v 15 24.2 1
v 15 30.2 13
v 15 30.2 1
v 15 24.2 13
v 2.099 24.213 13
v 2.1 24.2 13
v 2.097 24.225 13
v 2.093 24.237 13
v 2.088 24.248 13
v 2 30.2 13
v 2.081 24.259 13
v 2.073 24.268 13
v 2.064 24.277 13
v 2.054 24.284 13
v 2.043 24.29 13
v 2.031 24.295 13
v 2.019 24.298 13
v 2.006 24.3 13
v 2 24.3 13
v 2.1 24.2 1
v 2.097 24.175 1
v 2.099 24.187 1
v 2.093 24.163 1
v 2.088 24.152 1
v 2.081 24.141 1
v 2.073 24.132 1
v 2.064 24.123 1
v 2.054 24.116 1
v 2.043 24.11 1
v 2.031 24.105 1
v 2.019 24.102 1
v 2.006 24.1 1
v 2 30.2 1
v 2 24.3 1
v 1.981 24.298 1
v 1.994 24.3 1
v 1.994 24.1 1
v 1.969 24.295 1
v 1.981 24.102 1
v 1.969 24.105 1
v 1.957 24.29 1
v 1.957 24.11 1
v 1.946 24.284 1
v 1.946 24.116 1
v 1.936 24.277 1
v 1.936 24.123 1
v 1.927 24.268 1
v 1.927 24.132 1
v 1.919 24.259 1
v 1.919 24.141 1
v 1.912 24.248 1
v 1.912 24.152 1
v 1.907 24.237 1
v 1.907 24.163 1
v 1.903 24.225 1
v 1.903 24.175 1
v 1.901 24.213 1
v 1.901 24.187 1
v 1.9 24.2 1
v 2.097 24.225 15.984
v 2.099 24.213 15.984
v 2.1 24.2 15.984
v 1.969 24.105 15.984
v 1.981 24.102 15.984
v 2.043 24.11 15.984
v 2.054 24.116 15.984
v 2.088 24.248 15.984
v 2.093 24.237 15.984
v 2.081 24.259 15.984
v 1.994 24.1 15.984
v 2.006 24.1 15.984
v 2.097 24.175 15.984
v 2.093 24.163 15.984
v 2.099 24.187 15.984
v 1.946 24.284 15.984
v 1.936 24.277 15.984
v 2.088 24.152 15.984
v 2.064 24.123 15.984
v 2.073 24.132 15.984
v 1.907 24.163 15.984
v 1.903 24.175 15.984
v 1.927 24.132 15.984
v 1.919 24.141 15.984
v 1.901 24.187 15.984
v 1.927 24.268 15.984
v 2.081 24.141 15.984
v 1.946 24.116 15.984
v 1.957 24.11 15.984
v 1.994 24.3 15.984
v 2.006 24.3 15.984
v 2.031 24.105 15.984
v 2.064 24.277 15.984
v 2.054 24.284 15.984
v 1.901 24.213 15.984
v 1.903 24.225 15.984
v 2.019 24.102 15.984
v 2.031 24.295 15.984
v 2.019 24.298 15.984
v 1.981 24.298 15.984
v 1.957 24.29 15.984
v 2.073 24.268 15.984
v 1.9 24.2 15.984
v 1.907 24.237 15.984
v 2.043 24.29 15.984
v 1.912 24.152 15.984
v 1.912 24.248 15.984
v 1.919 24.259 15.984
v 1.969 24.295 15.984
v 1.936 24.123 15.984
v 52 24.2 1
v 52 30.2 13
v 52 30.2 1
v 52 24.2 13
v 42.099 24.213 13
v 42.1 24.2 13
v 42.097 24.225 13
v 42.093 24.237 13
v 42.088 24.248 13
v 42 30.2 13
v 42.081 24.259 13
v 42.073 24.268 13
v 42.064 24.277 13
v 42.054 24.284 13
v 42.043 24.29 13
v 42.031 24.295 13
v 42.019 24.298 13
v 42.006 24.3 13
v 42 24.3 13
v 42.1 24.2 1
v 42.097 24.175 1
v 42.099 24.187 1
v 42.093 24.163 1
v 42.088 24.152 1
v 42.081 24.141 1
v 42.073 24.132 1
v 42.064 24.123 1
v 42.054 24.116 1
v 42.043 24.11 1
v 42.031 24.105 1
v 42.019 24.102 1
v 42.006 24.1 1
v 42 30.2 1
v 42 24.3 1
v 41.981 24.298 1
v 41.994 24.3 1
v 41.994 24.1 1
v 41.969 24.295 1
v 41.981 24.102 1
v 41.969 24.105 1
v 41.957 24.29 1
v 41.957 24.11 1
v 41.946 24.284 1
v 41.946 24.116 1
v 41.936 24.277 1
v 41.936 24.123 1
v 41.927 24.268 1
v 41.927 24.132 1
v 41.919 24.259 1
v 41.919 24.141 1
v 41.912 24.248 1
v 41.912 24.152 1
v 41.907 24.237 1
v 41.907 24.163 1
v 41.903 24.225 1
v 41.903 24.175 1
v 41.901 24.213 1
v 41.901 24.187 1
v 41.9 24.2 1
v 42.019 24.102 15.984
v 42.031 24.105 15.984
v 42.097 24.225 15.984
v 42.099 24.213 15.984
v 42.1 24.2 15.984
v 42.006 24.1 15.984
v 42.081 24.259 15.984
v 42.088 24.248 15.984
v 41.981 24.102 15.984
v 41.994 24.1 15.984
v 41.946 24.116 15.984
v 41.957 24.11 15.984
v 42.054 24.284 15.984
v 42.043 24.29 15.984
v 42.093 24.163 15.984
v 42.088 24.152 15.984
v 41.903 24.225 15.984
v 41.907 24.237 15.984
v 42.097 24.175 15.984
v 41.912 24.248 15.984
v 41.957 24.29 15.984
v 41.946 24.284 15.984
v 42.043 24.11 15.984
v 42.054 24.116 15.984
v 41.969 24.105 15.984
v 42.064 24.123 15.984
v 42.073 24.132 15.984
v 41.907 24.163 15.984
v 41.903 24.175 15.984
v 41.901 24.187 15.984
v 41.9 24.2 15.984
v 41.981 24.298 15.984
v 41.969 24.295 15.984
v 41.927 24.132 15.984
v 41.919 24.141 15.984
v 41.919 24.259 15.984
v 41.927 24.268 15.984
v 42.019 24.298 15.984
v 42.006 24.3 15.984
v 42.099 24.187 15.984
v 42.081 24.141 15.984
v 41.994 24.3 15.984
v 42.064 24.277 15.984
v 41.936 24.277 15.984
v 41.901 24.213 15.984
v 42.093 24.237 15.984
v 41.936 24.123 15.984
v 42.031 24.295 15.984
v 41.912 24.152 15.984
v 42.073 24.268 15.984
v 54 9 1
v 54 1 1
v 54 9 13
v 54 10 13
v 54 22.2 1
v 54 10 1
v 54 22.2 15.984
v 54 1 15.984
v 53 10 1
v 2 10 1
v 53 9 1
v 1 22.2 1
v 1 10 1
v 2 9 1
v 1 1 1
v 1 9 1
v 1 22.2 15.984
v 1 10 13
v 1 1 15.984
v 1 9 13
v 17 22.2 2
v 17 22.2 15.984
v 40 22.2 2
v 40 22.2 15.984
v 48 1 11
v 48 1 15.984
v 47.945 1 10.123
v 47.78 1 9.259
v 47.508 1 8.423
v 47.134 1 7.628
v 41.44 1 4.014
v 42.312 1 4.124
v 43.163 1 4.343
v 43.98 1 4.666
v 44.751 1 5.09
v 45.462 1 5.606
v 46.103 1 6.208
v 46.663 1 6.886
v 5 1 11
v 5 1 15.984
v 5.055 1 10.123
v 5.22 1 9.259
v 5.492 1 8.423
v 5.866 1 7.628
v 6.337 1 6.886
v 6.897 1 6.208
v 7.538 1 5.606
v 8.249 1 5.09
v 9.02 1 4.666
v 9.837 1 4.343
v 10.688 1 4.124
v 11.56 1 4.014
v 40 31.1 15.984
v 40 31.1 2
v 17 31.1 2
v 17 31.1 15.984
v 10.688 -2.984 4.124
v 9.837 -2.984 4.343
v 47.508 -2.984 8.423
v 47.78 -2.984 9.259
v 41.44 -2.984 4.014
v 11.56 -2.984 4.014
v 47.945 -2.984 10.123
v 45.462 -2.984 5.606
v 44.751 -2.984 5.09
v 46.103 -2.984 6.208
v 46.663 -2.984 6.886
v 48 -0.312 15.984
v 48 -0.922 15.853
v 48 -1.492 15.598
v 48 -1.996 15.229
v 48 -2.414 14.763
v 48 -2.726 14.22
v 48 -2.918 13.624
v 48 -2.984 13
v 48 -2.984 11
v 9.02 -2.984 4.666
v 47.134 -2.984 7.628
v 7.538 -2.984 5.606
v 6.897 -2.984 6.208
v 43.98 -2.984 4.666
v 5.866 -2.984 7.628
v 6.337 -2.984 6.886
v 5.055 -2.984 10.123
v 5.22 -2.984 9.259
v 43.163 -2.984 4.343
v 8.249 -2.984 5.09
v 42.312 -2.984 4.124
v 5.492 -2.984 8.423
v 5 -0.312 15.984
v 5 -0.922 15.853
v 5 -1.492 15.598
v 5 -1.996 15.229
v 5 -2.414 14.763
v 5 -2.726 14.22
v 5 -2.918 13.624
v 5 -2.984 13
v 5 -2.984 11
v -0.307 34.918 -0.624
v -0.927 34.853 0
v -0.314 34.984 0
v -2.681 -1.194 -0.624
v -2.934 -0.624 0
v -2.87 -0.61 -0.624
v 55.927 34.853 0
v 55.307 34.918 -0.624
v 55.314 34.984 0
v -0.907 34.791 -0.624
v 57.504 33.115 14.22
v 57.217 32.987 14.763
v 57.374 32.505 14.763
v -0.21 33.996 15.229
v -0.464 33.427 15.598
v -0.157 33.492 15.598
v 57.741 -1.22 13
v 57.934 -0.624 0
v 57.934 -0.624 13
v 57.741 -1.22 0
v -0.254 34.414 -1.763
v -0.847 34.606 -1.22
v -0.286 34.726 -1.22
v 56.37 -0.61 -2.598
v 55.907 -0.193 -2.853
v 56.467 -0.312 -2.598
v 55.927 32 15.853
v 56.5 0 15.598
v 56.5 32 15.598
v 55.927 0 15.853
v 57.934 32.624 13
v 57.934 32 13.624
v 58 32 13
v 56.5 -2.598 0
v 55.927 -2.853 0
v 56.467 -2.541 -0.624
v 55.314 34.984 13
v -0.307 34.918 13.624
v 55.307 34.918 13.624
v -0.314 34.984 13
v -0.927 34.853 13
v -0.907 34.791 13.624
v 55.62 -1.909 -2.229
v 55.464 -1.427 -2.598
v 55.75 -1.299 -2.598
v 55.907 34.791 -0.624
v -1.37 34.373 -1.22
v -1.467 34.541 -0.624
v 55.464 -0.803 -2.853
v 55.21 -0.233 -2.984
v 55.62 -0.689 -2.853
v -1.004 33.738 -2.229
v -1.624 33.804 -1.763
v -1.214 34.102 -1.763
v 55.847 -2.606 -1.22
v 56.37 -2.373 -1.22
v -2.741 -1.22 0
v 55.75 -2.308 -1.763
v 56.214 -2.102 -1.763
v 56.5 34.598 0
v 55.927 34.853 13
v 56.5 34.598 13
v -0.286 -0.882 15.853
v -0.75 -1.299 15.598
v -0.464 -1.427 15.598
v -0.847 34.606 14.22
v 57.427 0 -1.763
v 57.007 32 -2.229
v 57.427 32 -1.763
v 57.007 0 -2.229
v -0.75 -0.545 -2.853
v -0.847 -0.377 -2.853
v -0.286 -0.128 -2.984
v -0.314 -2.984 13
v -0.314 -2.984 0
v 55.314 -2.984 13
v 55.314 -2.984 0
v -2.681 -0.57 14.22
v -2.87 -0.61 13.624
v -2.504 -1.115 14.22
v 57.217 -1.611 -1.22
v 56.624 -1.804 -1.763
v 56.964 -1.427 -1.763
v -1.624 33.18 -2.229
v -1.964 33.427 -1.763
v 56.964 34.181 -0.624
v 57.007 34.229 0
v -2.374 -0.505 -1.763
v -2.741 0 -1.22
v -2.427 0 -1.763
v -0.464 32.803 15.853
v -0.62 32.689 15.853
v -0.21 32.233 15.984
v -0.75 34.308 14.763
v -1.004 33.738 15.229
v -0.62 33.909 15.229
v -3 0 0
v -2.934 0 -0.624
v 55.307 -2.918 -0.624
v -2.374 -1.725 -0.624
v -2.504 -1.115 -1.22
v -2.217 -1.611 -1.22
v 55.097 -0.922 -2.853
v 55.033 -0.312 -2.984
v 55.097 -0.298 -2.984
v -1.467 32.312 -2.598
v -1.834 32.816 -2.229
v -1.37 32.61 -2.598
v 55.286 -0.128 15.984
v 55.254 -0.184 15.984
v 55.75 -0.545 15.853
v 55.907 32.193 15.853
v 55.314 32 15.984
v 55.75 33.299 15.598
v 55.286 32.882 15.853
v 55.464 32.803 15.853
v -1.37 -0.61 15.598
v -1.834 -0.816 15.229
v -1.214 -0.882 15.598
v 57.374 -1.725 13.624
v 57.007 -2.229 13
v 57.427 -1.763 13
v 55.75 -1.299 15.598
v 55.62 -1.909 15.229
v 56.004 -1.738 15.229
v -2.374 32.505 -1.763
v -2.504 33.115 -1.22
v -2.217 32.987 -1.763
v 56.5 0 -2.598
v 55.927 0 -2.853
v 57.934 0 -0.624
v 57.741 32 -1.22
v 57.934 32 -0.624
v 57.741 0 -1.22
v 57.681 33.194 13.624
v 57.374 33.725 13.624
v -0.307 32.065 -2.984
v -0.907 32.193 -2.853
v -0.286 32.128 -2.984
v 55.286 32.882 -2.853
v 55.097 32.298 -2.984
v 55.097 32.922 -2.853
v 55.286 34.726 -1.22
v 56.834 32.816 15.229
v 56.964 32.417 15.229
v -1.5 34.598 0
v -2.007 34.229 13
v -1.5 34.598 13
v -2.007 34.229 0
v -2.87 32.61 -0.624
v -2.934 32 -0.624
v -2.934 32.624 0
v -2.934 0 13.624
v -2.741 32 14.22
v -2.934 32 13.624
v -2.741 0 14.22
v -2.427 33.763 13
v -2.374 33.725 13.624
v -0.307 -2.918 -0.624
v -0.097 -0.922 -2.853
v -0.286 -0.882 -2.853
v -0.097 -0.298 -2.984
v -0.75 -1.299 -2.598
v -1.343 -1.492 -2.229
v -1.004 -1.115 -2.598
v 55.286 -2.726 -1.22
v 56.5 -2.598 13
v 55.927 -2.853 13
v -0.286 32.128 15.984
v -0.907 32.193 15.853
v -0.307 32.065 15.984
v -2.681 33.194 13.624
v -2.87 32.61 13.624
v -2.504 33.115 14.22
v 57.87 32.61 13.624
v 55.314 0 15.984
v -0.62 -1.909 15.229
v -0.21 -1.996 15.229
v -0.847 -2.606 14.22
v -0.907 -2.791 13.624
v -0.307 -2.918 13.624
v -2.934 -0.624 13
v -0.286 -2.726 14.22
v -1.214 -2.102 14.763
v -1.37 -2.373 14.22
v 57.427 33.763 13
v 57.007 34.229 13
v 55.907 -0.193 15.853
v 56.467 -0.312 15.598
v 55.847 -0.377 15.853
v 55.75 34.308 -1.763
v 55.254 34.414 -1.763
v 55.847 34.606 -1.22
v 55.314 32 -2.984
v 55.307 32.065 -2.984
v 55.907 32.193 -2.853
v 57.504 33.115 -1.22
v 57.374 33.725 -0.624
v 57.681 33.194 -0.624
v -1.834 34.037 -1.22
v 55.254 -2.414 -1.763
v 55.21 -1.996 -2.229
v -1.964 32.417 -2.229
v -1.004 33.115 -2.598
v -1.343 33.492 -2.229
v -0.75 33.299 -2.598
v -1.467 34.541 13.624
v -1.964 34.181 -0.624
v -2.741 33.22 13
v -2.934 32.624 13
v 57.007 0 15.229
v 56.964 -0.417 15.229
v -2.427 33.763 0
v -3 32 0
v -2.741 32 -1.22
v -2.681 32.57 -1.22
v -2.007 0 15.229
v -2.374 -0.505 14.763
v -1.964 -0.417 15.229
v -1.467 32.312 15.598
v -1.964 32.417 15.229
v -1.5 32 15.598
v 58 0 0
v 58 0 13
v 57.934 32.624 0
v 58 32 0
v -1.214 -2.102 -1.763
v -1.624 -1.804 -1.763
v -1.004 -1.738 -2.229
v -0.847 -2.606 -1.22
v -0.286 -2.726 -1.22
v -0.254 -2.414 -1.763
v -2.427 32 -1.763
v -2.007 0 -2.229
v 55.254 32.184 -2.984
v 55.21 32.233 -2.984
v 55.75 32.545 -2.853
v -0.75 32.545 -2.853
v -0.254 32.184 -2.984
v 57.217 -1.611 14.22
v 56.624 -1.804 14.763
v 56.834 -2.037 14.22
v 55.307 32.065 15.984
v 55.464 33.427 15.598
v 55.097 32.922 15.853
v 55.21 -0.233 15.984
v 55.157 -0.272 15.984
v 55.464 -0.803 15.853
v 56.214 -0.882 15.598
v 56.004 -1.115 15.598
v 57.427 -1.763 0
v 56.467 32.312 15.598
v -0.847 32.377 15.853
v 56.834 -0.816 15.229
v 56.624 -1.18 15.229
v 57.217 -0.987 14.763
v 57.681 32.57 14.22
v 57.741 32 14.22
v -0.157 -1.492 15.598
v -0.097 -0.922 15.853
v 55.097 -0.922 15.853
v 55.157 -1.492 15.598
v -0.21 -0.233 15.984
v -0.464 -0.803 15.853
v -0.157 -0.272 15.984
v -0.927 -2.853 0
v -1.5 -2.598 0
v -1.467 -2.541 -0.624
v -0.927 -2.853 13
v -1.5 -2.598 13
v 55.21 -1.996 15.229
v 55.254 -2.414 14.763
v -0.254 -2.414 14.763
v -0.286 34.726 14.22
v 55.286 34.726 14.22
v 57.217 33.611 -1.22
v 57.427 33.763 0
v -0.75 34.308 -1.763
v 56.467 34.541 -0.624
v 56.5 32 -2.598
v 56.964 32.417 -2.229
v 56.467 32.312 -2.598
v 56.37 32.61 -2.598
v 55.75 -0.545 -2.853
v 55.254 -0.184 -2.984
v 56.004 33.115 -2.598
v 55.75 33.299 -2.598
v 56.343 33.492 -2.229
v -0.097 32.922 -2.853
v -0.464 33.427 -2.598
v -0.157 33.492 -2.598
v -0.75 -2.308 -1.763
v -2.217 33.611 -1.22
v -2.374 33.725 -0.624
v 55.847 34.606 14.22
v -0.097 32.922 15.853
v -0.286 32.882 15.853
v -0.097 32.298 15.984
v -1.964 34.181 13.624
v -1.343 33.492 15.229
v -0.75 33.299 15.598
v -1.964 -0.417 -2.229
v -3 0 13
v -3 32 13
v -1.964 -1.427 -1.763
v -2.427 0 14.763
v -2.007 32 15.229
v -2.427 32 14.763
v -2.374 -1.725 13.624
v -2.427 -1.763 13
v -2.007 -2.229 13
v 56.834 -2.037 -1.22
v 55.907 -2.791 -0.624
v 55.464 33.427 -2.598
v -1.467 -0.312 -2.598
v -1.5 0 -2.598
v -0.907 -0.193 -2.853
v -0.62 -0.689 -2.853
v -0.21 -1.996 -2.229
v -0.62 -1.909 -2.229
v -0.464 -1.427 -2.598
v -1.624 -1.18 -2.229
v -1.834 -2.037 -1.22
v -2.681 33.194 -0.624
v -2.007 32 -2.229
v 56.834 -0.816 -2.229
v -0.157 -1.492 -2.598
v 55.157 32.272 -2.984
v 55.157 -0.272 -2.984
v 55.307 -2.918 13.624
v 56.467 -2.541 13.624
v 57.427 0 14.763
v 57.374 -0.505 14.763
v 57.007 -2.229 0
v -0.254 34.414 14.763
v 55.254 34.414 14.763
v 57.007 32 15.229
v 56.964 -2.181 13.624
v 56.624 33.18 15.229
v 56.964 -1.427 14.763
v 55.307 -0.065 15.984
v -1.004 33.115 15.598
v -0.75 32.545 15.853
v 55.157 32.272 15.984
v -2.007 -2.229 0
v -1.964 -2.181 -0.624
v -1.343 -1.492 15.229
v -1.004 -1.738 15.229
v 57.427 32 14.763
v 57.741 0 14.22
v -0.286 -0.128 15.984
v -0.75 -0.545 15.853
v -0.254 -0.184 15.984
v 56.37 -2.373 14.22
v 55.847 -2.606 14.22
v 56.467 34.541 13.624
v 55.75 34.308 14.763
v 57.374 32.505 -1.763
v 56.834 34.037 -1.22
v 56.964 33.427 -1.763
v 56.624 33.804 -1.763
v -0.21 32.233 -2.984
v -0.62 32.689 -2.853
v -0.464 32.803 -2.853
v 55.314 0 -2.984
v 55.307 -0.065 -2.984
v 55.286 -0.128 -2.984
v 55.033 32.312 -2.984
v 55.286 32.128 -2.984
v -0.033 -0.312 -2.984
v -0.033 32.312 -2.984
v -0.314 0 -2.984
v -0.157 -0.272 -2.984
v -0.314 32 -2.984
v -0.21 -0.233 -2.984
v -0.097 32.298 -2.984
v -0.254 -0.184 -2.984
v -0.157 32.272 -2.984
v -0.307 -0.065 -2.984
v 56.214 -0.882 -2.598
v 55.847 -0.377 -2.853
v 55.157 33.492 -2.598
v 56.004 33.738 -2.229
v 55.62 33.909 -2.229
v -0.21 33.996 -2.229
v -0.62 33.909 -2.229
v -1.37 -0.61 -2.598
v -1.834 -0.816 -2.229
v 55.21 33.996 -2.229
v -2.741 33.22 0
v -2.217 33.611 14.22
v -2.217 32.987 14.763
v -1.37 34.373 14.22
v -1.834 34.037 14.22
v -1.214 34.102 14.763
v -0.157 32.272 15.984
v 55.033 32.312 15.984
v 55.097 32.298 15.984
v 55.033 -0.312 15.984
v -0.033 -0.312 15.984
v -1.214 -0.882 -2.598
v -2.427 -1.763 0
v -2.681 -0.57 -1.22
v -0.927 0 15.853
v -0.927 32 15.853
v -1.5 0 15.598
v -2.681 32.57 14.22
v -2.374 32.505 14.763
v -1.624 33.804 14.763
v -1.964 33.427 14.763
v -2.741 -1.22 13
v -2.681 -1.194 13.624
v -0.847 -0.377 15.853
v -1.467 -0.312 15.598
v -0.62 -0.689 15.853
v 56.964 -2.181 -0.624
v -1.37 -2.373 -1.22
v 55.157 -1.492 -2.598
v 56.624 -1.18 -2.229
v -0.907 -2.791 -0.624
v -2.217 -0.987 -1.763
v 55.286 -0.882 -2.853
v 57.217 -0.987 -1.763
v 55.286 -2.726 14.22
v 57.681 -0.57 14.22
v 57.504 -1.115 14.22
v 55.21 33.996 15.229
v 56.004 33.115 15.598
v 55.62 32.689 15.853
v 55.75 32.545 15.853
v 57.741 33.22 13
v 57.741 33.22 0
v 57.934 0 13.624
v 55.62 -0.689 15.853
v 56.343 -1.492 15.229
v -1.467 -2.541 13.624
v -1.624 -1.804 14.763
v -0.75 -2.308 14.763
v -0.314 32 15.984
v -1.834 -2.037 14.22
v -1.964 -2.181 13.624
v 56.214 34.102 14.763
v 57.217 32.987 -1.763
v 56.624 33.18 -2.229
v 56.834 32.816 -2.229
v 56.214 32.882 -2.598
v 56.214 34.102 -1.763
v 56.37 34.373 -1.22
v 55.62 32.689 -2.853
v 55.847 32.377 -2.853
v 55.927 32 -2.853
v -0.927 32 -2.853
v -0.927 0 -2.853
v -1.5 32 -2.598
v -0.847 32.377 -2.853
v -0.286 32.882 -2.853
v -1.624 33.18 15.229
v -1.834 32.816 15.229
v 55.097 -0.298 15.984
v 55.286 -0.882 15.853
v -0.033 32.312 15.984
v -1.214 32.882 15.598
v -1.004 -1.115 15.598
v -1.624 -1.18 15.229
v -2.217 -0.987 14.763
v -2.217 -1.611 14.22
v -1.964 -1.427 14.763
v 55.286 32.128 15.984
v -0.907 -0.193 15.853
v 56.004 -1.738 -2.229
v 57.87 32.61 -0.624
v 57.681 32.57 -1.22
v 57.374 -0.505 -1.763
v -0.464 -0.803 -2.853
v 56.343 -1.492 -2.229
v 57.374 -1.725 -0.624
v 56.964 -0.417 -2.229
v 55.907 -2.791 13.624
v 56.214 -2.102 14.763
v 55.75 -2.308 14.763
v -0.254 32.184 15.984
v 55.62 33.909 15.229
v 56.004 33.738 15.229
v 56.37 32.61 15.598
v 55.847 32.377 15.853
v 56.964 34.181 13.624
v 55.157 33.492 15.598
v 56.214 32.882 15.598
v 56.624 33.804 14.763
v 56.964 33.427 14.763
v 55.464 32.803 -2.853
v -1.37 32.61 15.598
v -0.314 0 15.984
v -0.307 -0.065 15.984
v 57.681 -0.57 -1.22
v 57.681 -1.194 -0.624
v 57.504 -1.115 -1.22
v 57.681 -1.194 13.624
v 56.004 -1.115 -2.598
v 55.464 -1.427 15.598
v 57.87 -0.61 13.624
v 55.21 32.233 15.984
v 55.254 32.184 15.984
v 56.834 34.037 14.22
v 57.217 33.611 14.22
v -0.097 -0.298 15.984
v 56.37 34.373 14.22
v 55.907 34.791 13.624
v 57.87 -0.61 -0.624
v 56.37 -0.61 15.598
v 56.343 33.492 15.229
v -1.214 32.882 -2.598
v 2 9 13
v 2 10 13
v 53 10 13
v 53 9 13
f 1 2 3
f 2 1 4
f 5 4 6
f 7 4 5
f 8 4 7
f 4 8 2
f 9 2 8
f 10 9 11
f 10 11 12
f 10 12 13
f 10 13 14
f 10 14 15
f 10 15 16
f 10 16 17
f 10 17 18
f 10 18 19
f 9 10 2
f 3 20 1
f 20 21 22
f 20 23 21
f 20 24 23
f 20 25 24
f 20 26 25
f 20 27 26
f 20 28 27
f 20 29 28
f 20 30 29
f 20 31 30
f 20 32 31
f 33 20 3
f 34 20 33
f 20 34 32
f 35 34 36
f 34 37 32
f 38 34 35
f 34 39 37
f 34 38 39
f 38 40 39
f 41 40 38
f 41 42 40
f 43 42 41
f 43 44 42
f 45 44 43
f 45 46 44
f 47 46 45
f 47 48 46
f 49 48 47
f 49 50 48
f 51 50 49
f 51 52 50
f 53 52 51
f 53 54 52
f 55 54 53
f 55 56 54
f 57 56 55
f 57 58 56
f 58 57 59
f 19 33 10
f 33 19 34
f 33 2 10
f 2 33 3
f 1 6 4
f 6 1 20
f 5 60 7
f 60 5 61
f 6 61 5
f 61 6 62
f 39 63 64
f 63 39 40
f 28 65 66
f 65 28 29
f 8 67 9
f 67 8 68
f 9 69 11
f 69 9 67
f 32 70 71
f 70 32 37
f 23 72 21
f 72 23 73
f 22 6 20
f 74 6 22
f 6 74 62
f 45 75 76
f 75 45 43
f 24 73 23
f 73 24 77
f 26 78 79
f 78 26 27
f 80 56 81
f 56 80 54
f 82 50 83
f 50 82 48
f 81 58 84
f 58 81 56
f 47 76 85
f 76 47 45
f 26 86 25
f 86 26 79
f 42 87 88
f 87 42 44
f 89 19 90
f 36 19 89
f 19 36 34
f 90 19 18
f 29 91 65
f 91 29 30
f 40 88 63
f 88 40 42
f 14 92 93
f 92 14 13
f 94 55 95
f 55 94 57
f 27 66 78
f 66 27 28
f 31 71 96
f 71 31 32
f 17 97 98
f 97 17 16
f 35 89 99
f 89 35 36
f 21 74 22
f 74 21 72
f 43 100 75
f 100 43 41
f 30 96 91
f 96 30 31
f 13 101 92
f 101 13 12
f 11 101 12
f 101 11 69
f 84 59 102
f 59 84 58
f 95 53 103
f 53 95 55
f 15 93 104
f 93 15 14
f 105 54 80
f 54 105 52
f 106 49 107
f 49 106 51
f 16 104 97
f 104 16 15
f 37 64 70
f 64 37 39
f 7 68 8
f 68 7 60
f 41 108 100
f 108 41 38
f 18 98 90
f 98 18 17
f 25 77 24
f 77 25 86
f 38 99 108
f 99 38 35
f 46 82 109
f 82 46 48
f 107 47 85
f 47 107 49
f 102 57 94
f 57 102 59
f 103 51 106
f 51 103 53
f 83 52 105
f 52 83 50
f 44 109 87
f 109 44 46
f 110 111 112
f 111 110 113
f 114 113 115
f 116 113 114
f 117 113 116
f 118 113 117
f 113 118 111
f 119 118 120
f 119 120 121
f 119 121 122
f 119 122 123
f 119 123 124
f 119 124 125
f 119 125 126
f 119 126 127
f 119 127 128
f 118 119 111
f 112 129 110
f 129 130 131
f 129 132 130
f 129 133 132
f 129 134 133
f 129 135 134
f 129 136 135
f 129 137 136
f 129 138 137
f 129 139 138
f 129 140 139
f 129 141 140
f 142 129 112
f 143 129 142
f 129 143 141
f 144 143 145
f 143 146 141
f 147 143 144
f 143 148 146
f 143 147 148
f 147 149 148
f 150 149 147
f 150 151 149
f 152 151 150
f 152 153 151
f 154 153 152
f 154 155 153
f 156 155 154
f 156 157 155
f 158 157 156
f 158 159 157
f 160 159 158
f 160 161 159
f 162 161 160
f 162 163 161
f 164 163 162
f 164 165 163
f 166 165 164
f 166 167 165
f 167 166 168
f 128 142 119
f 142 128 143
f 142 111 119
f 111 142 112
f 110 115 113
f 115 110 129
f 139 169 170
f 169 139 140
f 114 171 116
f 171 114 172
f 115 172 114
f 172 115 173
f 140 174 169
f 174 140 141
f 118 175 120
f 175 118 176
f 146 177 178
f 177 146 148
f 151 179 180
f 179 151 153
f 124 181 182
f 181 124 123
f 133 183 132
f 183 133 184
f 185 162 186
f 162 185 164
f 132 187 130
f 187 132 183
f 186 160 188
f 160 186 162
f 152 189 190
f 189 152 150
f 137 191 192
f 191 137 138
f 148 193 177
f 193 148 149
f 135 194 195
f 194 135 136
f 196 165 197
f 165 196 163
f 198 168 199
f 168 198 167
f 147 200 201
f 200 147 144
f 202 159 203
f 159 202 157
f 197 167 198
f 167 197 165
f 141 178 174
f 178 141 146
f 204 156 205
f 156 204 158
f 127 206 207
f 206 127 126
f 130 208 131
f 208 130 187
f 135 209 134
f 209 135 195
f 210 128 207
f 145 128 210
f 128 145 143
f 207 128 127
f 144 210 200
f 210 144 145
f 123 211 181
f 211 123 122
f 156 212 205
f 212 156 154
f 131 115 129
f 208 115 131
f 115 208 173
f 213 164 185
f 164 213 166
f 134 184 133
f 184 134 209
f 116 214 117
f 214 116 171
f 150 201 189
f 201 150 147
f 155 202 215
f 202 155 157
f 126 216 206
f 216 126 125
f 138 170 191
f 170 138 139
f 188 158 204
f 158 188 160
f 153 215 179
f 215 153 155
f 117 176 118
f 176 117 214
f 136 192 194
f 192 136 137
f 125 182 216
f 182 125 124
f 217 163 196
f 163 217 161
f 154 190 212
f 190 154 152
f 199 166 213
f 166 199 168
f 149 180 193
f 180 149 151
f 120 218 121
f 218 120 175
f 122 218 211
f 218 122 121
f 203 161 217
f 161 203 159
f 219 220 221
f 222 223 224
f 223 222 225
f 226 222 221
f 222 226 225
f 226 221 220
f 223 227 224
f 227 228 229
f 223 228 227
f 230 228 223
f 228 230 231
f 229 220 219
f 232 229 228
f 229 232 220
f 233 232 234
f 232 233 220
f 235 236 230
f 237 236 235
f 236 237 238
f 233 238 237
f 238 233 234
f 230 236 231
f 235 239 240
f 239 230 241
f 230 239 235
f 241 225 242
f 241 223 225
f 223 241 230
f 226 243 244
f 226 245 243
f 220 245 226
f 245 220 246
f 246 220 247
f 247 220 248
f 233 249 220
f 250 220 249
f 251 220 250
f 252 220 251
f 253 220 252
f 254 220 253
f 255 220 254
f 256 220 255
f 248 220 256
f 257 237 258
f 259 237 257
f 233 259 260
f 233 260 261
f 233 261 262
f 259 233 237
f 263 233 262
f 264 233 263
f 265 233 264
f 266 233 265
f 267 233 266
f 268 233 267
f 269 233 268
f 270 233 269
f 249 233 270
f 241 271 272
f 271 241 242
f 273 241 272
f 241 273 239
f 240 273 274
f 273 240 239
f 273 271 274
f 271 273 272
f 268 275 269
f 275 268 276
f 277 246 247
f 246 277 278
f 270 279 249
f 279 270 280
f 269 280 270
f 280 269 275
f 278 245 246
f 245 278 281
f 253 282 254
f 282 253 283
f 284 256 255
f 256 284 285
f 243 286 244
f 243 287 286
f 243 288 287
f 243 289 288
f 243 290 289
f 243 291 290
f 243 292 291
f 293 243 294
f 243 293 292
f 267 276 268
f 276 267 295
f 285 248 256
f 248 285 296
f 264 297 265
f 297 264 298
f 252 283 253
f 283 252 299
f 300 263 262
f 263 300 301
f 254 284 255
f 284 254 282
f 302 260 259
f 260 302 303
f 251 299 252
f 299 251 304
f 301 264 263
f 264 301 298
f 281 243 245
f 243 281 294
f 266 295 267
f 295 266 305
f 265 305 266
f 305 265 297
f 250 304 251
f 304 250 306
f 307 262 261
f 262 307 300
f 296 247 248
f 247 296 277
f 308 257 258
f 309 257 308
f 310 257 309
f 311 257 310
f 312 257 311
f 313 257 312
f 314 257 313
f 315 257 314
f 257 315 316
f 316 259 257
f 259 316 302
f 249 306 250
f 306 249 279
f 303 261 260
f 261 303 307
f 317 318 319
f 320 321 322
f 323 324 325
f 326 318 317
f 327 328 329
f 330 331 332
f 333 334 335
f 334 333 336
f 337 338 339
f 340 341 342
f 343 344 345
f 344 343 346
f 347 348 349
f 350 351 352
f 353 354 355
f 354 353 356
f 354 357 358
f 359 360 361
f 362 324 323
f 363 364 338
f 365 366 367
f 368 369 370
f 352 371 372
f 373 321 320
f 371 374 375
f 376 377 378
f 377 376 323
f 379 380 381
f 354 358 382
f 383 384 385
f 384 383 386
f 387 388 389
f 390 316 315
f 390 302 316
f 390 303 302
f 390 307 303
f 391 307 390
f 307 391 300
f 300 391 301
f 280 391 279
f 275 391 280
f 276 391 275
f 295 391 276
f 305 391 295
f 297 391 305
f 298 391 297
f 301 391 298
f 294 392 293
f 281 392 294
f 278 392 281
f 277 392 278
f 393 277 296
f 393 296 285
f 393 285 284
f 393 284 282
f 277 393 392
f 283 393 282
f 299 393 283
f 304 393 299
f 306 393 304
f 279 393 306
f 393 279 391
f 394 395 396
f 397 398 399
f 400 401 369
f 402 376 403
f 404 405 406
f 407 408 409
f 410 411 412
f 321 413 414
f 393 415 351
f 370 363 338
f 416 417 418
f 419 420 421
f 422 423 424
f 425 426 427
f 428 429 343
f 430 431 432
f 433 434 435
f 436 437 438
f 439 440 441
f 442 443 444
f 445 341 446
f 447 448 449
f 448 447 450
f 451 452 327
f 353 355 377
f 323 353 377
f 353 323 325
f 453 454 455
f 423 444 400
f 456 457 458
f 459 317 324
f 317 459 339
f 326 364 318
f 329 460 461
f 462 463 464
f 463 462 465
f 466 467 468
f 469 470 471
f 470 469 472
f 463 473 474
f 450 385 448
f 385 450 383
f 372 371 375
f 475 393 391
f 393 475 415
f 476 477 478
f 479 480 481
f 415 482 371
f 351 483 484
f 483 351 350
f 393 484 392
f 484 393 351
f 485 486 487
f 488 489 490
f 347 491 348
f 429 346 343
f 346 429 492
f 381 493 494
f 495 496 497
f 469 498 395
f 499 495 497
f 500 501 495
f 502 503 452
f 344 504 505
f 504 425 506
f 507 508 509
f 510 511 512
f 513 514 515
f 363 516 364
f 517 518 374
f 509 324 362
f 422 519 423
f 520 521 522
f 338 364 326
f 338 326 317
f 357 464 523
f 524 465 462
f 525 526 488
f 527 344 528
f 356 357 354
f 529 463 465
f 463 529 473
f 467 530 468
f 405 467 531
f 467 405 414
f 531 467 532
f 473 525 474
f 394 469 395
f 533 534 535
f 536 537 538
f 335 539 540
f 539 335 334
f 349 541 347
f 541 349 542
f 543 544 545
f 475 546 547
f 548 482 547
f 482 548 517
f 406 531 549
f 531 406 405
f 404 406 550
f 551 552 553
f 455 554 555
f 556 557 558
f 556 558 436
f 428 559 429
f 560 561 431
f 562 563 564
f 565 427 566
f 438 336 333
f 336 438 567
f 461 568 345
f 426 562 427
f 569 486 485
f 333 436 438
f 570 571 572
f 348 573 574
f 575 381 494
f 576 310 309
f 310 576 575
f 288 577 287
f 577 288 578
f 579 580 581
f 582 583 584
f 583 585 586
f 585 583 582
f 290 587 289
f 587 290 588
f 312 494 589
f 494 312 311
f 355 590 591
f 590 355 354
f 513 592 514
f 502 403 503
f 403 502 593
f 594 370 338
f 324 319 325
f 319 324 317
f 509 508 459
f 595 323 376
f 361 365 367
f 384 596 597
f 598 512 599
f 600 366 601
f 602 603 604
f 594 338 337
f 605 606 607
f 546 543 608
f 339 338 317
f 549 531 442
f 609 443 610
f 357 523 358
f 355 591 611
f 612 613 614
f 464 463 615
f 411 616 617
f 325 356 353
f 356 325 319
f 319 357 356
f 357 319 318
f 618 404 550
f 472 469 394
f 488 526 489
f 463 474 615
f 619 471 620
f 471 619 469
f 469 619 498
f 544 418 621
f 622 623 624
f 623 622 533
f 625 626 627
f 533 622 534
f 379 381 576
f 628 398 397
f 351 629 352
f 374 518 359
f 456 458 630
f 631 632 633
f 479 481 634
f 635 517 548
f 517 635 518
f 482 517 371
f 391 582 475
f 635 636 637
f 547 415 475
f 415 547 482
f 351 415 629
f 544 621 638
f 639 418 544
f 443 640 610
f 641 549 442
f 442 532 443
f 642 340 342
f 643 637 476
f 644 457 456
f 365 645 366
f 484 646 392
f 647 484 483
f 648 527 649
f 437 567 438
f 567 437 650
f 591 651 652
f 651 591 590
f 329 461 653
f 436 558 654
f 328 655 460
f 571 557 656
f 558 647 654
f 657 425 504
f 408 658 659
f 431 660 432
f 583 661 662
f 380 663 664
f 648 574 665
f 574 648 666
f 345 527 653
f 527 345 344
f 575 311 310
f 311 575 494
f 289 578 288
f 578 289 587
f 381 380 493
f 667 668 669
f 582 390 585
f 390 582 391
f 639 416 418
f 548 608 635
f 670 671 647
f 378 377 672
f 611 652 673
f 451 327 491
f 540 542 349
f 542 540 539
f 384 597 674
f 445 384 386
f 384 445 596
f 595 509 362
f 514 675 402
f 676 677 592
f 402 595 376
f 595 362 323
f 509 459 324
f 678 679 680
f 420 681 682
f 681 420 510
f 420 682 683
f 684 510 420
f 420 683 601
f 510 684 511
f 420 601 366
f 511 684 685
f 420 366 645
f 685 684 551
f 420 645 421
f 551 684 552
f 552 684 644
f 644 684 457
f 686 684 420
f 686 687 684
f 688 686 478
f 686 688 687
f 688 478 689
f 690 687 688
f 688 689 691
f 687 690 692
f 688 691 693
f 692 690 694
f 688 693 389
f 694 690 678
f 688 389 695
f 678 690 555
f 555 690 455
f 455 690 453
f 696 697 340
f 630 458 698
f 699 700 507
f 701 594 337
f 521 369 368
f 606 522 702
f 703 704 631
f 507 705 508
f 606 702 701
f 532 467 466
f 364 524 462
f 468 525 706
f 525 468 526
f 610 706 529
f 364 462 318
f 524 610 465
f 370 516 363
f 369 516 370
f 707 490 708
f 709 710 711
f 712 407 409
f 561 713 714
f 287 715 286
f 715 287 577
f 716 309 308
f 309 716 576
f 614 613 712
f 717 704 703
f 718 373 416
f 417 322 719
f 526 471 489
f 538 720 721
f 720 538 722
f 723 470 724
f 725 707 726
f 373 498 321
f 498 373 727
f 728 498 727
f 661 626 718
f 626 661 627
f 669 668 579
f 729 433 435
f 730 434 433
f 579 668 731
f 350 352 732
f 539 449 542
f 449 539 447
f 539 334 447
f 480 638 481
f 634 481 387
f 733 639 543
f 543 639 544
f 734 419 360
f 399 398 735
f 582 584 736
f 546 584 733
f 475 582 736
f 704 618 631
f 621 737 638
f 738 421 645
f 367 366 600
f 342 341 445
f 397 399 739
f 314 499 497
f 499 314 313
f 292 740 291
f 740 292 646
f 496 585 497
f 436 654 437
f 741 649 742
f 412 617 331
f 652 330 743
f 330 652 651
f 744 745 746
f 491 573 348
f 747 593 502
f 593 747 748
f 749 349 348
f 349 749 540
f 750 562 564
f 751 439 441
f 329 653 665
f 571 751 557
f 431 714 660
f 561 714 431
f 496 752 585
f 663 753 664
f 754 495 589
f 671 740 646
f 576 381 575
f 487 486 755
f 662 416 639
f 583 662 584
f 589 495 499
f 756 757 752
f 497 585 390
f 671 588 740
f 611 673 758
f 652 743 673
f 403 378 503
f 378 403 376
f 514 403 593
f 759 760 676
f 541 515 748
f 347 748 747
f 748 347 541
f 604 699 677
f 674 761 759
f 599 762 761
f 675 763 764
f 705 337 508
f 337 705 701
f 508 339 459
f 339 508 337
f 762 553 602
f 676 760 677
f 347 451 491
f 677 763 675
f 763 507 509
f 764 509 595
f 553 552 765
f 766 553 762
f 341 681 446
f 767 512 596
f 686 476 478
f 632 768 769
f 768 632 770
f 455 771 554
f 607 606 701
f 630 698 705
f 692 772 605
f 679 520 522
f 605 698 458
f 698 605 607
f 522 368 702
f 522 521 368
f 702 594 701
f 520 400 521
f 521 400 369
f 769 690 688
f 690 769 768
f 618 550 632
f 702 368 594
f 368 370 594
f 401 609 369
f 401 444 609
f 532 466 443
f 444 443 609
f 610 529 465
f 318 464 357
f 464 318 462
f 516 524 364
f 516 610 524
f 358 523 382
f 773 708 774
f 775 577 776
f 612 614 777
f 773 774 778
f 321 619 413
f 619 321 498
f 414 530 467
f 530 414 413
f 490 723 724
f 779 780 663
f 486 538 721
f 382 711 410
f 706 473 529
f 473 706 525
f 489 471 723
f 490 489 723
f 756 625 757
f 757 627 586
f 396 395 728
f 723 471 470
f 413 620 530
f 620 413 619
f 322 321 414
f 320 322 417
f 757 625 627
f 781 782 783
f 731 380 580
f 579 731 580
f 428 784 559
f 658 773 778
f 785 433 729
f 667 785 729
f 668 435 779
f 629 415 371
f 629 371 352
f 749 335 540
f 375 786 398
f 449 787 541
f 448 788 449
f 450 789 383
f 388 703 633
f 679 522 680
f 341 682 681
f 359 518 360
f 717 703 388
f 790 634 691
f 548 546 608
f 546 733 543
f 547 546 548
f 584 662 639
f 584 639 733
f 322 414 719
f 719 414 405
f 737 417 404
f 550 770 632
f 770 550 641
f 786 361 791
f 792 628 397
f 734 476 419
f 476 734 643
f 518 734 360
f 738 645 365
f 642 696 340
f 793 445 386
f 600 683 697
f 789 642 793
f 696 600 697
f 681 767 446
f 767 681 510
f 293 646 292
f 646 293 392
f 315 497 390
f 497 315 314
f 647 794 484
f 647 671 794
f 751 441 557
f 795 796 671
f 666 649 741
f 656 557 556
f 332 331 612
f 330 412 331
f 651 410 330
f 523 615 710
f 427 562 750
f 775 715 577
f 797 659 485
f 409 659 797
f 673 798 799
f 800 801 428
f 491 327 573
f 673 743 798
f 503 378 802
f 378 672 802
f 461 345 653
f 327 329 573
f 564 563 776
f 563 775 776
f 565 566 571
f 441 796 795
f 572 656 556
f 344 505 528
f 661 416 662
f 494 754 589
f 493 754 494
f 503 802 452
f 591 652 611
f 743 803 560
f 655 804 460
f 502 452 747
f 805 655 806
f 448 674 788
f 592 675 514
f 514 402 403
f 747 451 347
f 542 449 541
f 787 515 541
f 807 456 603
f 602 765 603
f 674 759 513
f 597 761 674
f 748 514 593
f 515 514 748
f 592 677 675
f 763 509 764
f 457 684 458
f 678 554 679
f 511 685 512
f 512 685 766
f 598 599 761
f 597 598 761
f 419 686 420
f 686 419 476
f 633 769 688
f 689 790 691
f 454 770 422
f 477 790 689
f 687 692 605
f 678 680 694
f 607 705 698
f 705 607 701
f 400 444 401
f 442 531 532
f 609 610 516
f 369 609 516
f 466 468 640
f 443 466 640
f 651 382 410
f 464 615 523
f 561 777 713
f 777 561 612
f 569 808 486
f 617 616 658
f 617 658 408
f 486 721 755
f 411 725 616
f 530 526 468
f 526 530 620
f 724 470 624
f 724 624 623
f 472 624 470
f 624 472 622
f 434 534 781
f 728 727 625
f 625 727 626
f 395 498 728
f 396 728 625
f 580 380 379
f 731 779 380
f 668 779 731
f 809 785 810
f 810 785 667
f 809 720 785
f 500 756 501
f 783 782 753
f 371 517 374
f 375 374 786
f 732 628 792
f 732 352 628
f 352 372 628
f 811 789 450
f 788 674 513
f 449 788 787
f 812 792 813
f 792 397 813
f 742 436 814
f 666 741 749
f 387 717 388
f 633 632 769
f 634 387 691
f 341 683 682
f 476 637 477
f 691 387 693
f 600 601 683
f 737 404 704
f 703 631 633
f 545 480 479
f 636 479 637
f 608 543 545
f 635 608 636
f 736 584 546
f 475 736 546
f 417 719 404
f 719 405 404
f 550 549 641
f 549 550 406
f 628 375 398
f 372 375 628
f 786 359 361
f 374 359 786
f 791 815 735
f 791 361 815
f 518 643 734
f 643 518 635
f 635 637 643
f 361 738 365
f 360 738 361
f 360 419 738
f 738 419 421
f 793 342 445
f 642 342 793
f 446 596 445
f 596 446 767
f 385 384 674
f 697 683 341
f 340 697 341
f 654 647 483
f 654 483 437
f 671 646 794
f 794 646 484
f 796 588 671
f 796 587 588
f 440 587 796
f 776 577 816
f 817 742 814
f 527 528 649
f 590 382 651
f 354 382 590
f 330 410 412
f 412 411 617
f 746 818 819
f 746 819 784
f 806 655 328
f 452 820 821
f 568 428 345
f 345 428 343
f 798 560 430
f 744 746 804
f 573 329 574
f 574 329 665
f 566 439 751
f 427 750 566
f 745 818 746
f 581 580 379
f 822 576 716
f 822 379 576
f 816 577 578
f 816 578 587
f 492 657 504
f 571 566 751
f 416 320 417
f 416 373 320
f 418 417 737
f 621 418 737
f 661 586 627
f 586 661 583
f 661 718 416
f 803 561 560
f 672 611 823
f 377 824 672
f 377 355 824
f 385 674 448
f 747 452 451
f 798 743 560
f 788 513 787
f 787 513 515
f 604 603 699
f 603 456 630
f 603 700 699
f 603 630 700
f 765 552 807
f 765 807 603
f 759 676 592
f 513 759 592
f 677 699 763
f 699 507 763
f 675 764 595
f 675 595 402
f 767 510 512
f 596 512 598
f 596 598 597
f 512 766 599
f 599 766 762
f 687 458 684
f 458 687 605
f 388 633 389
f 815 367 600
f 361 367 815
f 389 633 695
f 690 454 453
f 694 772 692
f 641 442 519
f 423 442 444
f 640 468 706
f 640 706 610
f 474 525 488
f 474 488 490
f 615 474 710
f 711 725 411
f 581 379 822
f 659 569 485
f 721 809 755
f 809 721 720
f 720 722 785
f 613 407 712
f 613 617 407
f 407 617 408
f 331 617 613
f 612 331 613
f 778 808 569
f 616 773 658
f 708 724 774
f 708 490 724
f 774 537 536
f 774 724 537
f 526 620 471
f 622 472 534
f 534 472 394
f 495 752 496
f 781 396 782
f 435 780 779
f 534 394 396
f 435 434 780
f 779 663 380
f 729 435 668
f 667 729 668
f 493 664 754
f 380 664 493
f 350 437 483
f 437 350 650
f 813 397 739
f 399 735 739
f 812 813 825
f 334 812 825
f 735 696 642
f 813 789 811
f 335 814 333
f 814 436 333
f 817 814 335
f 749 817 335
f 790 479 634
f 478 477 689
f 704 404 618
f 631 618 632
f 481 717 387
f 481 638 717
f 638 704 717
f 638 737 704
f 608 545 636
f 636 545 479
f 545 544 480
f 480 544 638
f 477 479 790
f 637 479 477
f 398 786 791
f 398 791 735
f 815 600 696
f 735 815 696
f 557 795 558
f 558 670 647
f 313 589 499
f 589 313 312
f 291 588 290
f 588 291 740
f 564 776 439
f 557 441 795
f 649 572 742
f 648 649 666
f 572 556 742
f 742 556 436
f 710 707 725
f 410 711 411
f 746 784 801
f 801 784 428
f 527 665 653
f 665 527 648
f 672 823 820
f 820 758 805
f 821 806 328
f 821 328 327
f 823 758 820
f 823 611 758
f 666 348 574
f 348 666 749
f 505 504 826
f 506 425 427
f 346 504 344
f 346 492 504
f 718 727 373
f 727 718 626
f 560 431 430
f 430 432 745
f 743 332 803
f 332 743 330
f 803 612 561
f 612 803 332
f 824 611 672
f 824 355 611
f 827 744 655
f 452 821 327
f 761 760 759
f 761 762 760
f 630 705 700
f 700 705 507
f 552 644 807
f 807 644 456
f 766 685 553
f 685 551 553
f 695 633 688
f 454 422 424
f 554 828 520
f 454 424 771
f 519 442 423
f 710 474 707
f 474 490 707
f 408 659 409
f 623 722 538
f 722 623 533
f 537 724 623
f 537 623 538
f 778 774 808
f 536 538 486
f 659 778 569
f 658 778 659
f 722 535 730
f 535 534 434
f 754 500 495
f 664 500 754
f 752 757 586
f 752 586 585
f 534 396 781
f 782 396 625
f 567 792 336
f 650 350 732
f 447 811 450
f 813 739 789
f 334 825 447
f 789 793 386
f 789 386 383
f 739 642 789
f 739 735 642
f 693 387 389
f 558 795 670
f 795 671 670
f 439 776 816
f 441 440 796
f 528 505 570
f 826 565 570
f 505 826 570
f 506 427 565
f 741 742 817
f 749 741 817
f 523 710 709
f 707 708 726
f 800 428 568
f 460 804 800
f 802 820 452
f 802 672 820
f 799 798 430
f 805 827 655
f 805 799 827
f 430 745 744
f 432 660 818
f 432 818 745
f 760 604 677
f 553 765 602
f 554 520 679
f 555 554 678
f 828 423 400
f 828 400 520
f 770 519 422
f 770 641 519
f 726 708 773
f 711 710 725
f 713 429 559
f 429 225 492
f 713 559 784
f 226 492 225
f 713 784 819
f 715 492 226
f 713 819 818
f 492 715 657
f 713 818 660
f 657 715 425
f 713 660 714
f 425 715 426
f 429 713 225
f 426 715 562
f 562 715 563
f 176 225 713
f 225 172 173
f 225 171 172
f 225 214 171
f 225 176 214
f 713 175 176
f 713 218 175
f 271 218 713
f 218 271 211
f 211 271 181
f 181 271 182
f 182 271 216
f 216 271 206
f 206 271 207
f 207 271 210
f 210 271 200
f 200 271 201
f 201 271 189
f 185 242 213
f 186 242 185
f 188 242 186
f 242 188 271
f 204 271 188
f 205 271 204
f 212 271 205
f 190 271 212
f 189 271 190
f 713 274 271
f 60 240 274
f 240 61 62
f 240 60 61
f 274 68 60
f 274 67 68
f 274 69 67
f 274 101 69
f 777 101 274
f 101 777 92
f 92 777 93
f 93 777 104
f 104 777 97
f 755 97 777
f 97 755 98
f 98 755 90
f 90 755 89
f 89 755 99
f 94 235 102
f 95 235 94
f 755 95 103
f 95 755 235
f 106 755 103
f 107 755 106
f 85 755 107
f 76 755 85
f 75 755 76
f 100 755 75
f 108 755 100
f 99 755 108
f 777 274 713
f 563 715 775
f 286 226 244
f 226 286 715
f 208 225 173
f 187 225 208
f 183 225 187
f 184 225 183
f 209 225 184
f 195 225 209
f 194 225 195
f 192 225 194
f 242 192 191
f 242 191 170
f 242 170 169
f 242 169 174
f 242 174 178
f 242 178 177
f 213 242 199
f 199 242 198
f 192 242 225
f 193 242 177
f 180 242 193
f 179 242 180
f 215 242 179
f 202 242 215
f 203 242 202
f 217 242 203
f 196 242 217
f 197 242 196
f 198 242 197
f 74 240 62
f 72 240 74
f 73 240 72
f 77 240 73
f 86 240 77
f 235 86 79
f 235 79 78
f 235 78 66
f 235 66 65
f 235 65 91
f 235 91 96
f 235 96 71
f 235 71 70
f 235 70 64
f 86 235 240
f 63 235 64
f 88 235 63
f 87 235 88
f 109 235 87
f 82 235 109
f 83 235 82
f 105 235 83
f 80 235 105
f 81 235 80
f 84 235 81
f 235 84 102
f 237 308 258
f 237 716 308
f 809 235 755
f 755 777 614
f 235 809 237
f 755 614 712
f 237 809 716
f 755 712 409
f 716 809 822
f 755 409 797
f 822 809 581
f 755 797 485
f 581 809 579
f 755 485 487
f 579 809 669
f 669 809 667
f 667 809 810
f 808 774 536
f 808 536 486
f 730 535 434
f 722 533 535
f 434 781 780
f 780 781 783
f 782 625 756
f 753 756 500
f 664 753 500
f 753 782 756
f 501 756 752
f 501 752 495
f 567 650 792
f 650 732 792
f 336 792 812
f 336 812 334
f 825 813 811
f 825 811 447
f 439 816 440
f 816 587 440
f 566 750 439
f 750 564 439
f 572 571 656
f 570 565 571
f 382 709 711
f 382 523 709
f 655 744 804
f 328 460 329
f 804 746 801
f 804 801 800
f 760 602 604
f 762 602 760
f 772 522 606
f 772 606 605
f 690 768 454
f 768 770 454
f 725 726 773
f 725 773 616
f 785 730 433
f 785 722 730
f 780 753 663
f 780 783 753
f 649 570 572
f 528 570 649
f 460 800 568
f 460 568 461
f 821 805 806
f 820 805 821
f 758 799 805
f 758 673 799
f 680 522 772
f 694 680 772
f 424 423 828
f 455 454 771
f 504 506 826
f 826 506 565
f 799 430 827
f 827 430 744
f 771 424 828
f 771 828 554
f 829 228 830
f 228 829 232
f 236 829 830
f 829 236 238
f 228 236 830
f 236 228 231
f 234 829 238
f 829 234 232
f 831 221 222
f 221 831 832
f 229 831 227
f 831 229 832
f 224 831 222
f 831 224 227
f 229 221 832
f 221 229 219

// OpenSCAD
rand=1;			//Vertical Wall w/o minkowski sum
breite=53;			//Width ob main block 53sw 53.2bl
dicke=30;			//Thickness of main block
tiefe=12;			//Depth of main block w/o minkowski sum
fuss=1;				//Thickness of lower wall
dicke2=21.20;		//Thickness inner block
minkowskifn=30;	//reduce for speed


difference(){
	union(){
	minkowski(){
		cube([breite+(2*rand),dicke+2*rand,tiefe+fuss]); 					//Main Block	
		sphere(3,$fn=minkowskifn);
	}
	}
	union(){
		translate([rand,rand,fuss])
			cube([breite,dicke2,tiefe+10]);    								//Inner Block
		translate([17,rand+dicke2-0.1,fuss+1])
			cube([23,9,25]);													//Block for the Beltclip
		
		hull(){
			translate([12,5,10+fuss]){											//Frontwindow
				rotate([90,0,0])
				cylinder(h=10,r=7,$fn=50);
			}
			translate([breite-12,5,10+fuss]){
				rotate([90,0,0])
				cylinder(h=10,r=7,$fn=50);
			}
			translate([breite-12,5,10+fuss+20]){
				rotate([90,0,0])
				cylinder(h=10,r=7,$fn=50);
			}
			translate([12,5,10+fuss+20]){
				rotate([90,0,0])
				cylinder(h=10,r=7,$fn=50);
			}
		}											//Holes for Magnets 4mm*10mm (S-04-10-N supermagnete.de)
			//translate([8,27,-5]){
			//	cylinder(h=15,r=2,$fn=50);
			//}
			//translate([47,27,-5]){
			//	cylinder(h=15,r=2,$fn=50);
			//}
			translate([rand+1,dicke2+3,fuss]){
				cube([13,6,12]);
				#cylinder(h=20,r=0.1,$fn=50);
			}
			translate([42,dicke2+3,fuss]){
				cube([10,6,12]);
				#cylinder(h=20,r=0.1,$fn=50);
			}
	}
}
translate([rand,9,fuss])		//Haltestifte
	cube([1,1,12]);
translate([breite,9,fuss])
	cube([1,1,12]);
